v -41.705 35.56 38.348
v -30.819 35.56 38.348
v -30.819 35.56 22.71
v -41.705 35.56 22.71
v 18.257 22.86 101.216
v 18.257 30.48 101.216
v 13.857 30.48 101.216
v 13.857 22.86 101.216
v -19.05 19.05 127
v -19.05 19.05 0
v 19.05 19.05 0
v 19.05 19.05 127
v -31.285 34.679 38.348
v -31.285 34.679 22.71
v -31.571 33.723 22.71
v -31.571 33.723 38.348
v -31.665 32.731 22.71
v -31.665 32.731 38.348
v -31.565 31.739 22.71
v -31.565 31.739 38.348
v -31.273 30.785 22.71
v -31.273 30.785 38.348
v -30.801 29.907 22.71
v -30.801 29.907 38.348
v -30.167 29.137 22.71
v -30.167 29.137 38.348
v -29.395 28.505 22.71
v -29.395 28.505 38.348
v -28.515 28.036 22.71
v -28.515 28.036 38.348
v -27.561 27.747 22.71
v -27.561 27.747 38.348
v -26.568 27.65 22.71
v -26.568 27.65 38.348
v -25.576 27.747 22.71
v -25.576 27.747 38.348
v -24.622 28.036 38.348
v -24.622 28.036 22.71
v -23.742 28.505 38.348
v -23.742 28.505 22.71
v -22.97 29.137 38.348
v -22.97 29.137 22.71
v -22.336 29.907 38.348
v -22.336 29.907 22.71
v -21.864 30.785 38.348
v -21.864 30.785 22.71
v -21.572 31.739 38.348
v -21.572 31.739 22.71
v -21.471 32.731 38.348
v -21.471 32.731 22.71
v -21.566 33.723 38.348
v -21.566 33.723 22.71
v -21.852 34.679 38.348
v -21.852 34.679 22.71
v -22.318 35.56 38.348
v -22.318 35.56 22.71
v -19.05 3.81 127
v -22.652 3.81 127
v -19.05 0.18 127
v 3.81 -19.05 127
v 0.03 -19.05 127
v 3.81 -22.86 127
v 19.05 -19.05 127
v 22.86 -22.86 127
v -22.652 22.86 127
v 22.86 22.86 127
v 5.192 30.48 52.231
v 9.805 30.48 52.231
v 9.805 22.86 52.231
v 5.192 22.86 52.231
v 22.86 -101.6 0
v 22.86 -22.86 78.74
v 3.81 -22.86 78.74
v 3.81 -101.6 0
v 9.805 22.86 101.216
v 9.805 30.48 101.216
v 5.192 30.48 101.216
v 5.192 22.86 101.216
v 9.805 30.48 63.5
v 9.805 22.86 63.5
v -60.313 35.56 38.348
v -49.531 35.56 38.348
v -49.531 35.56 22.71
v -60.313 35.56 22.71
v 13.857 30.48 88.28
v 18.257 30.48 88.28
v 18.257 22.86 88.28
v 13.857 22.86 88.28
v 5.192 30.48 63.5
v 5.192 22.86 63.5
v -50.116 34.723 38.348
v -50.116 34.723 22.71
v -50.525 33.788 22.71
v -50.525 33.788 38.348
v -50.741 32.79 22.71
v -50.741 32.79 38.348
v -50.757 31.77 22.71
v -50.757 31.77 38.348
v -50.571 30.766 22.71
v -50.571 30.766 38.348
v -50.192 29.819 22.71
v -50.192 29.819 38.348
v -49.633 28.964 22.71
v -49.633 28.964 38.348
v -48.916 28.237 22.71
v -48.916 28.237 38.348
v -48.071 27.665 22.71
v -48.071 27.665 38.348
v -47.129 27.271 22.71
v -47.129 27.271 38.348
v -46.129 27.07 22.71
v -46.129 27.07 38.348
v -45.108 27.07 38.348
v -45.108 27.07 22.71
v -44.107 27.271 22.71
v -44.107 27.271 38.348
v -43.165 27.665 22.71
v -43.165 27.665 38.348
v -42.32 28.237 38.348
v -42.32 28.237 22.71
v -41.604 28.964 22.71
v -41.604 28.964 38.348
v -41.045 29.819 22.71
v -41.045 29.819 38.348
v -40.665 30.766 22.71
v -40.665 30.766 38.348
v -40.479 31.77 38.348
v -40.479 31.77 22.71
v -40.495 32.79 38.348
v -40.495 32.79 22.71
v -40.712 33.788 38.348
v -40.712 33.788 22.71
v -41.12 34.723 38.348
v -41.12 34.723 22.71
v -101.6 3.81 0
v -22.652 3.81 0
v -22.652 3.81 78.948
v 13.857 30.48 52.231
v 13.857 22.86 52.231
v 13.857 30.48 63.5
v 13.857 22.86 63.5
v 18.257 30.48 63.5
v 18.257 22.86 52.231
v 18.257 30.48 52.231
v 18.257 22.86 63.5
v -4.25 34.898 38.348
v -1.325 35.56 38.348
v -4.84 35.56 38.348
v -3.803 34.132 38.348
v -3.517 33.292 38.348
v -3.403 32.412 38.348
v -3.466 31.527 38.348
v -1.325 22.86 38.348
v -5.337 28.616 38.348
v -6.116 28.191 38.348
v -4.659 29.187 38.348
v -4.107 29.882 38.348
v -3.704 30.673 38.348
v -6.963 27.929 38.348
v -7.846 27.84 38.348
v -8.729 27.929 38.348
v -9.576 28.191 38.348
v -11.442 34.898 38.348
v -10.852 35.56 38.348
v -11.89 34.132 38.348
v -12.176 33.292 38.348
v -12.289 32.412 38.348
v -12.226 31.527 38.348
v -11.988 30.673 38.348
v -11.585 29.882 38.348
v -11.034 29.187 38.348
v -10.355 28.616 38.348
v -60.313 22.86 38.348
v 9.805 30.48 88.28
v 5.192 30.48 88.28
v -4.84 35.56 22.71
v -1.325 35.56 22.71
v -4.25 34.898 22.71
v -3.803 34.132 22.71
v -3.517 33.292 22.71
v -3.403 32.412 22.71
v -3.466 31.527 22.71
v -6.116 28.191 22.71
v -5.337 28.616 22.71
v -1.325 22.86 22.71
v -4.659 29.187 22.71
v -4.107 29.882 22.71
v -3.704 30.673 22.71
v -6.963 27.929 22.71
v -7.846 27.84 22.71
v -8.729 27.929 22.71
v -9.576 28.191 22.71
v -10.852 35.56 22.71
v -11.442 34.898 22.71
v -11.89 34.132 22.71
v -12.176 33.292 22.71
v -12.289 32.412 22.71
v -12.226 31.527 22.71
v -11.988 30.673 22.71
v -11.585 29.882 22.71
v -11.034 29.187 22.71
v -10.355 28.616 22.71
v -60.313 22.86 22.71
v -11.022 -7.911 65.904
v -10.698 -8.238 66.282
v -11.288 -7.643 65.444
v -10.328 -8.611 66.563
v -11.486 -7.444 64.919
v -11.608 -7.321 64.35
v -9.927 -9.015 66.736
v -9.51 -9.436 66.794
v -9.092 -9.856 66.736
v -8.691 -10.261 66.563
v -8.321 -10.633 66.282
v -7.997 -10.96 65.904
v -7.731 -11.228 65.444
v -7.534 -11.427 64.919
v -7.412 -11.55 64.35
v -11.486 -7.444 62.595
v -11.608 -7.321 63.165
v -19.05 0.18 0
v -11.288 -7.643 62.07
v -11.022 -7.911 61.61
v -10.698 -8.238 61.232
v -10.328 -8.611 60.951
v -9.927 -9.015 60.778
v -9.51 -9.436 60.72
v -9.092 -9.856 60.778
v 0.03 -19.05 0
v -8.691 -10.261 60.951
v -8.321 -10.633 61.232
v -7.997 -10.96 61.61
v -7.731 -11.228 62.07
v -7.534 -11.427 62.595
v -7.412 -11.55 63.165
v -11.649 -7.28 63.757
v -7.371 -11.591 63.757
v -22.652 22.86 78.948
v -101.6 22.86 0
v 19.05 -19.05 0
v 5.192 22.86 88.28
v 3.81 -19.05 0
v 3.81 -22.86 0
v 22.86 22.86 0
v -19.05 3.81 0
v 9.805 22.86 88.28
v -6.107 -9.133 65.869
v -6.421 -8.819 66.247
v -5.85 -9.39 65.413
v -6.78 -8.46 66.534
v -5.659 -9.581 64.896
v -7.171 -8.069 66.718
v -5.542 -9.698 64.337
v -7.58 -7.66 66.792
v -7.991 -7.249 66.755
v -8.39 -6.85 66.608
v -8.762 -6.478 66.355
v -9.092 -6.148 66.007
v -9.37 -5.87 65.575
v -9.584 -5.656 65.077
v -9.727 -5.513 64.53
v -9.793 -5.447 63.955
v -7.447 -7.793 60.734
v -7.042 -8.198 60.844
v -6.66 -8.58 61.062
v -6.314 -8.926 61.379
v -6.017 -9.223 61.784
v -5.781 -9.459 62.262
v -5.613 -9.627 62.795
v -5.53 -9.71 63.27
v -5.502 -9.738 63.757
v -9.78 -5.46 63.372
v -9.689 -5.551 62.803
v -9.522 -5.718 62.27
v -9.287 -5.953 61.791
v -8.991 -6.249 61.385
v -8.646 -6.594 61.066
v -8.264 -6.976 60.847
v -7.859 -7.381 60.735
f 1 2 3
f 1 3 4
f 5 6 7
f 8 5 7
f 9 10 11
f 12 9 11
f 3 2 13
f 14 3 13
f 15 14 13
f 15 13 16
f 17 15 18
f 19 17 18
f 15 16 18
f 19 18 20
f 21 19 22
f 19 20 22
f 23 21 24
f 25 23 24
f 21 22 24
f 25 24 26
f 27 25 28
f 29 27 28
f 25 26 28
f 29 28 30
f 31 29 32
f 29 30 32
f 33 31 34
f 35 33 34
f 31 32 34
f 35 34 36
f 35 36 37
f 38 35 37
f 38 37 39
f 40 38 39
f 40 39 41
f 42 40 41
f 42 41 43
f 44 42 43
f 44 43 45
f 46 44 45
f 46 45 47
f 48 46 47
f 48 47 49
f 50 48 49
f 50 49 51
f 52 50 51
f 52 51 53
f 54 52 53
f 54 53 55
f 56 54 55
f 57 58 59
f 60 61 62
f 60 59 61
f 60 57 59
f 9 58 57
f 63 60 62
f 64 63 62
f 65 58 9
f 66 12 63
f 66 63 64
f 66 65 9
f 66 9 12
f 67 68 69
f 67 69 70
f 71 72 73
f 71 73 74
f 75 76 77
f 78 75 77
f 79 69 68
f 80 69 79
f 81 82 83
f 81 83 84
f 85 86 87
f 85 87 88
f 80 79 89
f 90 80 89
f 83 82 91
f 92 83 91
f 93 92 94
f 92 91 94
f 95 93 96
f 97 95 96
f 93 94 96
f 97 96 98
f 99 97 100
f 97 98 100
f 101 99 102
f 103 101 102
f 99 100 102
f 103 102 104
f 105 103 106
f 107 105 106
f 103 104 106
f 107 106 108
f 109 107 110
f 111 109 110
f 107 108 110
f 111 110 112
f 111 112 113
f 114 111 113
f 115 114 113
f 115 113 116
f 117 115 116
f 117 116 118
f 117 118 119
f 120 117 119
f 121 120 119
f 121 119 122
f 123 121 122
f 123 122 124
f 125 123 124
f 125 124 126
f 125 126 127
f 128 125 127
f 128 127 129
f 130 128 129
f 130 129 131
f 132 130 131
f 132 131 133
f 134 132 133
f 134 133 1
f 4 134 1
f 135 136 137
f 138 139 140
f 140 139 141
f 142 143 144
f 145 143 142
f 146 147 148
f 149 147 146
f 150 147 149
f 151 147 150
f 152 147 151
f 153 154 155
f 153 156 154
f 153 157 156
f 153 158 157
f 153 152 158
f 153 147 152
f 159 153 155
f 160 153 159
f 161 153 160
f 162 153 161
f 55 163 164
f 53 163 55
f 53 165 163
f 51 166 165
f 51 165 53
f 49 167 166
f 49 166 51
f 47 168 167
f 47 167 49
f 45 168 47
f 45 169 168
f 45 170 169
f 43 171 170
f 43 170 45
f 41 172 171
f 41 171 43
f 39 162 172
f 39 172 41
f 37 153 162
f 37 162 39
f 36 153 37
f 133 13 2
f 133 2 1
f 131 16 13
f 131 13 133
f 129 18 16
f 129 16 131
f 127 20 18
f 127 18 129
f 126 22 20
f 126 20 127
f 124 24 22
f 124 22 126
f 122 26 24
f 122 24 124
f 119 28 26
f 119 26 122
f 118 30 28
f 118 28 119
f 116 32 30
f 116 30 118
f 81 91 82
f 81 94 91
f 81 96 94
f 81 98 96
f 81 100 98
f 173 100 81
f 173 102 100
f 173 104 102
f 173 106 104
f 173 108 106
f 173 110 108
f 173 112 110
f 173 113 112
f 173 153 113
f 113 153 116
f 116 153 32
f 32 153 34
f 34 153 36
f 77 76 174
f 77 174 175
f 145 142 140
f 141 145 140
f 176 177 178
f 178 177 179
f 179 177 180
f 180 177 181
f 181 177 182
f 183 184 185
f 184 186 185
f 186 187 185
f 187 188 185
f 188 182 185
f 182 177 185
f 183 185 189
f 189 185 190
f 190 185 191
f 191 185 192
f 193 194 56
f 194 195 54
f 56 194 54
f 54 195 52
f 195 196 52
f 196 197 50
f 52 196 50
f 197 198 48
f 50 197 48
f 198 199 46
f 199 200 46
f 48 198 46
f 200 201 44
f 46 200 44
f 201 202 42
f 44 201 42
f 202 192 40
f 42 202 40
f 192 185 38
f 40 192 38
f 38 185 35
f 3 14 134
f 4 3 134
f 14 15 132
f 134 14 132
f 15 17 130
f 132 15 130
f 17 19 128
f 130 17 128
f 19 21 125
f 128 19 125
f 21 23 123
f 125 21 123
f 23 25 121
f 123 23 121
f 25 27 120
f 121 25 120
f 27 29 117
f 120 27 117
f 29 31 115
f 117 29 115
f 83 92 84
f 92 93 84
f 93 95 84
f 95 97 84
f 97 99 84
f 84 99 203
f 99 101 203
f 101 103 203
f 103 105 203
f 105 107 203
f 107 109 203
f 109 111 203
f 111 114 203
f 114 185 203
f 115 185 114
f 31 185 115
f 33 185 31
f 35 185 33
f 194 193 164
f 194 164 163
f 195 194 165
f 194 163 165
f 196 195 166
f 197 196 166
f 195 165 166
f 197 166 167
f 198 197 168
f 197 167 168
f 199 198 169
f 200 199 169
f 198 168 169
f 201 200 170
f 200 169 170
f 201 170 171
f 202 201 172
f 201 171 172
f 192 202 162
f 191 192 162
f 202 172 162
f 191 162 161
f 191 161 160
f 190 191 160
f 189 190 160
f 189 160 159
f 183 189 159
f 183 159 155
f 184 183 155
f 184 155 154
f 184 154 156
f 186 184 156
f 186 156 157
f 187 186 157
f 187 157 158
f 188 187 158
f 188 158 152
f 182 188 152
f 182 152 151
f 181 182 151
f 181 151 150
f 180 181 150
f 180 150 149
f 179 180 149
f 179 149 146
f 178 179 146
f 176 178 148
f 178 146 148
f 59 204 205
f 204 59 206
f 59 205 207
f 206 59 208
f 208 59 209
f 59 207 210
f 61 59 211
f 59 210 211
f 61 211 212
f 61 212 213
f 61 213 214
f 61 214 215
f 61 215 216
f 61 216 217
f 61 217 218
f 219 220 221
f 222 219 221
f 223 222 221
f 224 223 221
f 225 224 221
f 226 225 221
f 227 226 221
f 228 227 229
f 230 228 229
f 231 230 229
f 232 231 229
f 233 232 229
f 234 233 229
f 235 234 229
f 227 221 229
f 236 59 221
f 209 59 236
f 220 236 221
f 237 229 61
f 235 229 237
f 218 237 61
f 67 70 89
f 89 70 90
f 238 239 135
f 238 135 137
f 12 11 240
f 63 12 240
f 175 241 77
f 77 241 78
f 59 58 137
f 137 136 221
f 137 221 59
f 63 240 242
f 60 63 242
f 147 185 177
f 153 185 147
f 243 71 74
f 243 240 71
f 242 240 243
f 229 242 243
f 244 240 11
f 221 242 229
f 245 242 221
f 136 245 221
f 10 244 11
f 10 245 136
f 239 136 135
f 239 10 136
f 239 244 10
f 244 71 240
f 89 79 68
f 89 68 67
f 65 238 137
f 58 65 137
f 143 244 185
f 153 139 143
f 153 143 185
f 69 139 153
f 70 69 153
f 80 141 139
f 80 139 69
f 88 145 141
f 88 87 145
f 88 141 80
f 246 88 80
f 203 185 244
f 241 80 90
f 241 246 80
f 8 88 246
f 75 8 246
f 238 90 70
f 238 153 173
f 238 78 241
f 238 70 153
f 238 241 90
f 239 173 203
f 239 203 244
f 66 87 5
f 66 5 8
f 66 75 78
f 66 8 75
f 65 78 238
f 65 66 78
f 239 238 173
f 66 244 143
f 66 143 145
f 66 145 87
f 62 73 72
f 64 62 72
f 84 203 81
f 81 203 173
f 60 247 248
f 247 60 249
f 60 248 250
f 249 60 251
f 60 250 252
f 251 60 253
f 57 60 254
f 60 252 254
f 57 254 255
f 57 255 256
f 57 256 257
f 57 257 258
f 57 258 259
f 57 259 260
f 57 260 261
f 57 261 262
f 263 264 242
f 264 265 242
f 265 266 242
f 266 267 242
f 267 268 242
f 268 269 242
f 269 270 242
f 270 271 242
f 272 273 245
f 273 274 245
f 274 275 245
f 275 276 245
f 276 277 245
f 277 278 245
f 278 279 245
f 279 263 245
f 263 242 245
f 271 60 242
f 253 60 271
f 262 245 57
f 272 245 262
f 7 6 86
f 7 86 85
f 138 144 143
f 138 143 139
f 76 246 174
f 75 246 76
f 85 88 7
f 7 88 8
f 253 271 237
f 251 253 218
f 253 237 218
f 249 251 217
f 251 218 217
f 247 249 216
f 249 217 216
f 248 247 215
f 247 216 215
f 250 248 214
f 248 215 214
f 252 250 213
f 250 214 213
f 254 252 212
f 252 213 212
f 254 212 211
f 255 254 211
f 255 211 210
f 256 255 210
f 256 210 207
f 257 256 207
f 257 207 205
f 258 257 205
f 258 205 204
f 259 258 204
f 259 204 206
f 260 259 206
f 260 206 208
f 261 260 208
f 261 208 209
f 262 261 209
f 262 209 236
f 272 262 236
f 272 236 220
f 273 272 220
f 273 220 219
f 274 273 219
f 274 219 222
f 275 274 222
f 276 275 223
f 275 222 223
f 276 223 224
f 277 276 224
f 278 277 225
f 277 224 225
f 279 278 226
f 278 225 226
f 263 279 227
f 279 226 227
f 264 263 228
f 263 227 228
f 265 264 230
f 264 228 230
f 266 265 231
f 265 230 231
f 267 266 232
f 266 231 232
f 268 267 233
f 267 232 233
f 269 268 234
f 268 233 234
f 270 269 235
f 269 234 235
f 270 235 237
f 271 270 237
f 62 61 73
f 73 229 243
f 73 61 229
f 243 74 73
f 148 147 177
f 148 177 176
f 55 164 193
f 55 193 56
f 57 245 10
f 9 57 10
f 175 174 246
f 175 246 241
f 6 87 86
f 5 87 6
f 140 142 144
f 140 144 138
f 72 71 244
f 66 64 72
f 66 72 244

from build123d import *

# Parameters (mm, degrees)
F1_DEPTH  = 127
F3_DEPTH  = 19.05
F5_DEPTH  = 19.05
F6_R      = 3.0369743136
F7_DEPTH  = 25.4
F8_W      = 4.4003706425
F8_H      = 12.9362940788
F8_W_2    = 4.6123838983
F8_H_2    = 11.268997401
F9_DEPTH  = 7.62
F8_W_3    = 58.9885585941
F8_H_3    = 15.6373567879
F10_DEPTH = 12.7
F12_DEPTH = 25.4


with BuildPart() as f1:
    # F0 (on Top) → F1 (new body)
    with BuildSketch(Plane.XY):
        Polygon((-19.05, 3.81), (-19.05, 19.05), (19.05, 19.05), (19.05, -19.05), (3.81, -19.05), (0.0297182501, -19.05), (3.81, -22.86), (22.86, -22.86), (22.86, 22.86), (-22.6519722492, 22.86), (-22.6519722492, 3.81), (-19.05, 0.1797112604), align=None)
        Polygon((3.81, -19.05), (-19.05, 3.81), (-19.05, 0.1797112604), (0.0297182501, -19.05), align=None)
    extrude(amount=F1_DEPTH)

    # F2 (on face) → F3 (join)
    with BuildSketch(Plane.YZ.offset(22.86)):
        Polygon((-22.86, 0), (-22.86, 78.74), (-101.6, 0), align=None)
    extrude(amount=-F3_DEPTH)

    # F4 (on face) → F5 (join)
    with BuildSketch(Plane(origin=(0, 22.86, 0), x_dir=(-1, 0, 0), z_dir=(0, 1, 0))):
        Polygon((101.6, 0), (22.6519722492, 78.9480277508), (22.6519722492, 0), align=None)
    extrude(amount=-F5_DEPTH)

    # F6 (on face) → F7 (cut)
    with BuildSketch(Plane(origin=(-9.5097324965, -9.4355559587, 0), x_dir=(0.7043328456, -0.7098698772, 0), z_dir=(-0.7098698772, -0.7043328456, 0))):
        with Locations((0, 63.7570247054)):
            Circle(F6_R)
    extrude(amount=-F7_DEPTH, mode=Mode.SUBTRACT)

    # F8 (on face) → F9 (join)
    with BuildSketch(Plane(origin=(0, 22.86, 0), x_dir=(-1, 0, 0), z_dir=(0, 1, 0))):
        with Locations((-16.0567304119, 94.7479456663)):
            Rectangle(F8_W, F8_H)
        with Locations((-7.4986156542, 94.7479456663)):
            Rectangle(F8_W_2, F8_H)
        with Locations((-16.0567304119, 57.8655012995)):
            Rectangle(F8_W, F8_H_2)
        with Locations((-7.4986156542, 57.8655012995)):
            Rectangle(F8_W_2, F8_H_2)
    extrude(amount=F9_DEPTH)

    # F8 (on face) → F10 (join)
    with BuildSketch(Plane(origin=(0, 22.86, 0), x_dir=(-1, 0, 0), z_dir=(0, 1, 0))):
        with Locations((30.81879206, 30.5291432887)):
            Rectangle(F8_W_3, F8_H_3)
    extrude(amount=F10_DEPTH)

    # F11 (on face) → F12 (cut)
    with BuildSketch(Plane.XY.offset(38.3478216827)):
        with BuildLine():
            ThreePointArc((-49.531262368, 35.56), (-45.6181932241, 27.0444772391), (-41.7051240802, 35.56))
            Line((-41.7051240802, 35.56), (-49.531262368, 35.56))
        make_face()
        with BuildLine():
            ThreePointArc((-30.81879206, 35.56), (-26.5684658661, 27.6497786466), (-22.3181396723, 35.56))
            Line((-22.3181396723, 35.56), (-30.81879206, 35.56))
        make_face()
        with BuildLine():
            Line((-4.8403558321, 35.56), (-10.8519690111, 35.56))
            ThreePointArc((-10.8519690111, 35.56), (-7.8461624216, 27.8403776177), (-4.8403558321, 35.56))
        make_face()
    extrude(amount=-F12_DEPTH, mode=Mode.SUBTRACT)


solid = f1.part
